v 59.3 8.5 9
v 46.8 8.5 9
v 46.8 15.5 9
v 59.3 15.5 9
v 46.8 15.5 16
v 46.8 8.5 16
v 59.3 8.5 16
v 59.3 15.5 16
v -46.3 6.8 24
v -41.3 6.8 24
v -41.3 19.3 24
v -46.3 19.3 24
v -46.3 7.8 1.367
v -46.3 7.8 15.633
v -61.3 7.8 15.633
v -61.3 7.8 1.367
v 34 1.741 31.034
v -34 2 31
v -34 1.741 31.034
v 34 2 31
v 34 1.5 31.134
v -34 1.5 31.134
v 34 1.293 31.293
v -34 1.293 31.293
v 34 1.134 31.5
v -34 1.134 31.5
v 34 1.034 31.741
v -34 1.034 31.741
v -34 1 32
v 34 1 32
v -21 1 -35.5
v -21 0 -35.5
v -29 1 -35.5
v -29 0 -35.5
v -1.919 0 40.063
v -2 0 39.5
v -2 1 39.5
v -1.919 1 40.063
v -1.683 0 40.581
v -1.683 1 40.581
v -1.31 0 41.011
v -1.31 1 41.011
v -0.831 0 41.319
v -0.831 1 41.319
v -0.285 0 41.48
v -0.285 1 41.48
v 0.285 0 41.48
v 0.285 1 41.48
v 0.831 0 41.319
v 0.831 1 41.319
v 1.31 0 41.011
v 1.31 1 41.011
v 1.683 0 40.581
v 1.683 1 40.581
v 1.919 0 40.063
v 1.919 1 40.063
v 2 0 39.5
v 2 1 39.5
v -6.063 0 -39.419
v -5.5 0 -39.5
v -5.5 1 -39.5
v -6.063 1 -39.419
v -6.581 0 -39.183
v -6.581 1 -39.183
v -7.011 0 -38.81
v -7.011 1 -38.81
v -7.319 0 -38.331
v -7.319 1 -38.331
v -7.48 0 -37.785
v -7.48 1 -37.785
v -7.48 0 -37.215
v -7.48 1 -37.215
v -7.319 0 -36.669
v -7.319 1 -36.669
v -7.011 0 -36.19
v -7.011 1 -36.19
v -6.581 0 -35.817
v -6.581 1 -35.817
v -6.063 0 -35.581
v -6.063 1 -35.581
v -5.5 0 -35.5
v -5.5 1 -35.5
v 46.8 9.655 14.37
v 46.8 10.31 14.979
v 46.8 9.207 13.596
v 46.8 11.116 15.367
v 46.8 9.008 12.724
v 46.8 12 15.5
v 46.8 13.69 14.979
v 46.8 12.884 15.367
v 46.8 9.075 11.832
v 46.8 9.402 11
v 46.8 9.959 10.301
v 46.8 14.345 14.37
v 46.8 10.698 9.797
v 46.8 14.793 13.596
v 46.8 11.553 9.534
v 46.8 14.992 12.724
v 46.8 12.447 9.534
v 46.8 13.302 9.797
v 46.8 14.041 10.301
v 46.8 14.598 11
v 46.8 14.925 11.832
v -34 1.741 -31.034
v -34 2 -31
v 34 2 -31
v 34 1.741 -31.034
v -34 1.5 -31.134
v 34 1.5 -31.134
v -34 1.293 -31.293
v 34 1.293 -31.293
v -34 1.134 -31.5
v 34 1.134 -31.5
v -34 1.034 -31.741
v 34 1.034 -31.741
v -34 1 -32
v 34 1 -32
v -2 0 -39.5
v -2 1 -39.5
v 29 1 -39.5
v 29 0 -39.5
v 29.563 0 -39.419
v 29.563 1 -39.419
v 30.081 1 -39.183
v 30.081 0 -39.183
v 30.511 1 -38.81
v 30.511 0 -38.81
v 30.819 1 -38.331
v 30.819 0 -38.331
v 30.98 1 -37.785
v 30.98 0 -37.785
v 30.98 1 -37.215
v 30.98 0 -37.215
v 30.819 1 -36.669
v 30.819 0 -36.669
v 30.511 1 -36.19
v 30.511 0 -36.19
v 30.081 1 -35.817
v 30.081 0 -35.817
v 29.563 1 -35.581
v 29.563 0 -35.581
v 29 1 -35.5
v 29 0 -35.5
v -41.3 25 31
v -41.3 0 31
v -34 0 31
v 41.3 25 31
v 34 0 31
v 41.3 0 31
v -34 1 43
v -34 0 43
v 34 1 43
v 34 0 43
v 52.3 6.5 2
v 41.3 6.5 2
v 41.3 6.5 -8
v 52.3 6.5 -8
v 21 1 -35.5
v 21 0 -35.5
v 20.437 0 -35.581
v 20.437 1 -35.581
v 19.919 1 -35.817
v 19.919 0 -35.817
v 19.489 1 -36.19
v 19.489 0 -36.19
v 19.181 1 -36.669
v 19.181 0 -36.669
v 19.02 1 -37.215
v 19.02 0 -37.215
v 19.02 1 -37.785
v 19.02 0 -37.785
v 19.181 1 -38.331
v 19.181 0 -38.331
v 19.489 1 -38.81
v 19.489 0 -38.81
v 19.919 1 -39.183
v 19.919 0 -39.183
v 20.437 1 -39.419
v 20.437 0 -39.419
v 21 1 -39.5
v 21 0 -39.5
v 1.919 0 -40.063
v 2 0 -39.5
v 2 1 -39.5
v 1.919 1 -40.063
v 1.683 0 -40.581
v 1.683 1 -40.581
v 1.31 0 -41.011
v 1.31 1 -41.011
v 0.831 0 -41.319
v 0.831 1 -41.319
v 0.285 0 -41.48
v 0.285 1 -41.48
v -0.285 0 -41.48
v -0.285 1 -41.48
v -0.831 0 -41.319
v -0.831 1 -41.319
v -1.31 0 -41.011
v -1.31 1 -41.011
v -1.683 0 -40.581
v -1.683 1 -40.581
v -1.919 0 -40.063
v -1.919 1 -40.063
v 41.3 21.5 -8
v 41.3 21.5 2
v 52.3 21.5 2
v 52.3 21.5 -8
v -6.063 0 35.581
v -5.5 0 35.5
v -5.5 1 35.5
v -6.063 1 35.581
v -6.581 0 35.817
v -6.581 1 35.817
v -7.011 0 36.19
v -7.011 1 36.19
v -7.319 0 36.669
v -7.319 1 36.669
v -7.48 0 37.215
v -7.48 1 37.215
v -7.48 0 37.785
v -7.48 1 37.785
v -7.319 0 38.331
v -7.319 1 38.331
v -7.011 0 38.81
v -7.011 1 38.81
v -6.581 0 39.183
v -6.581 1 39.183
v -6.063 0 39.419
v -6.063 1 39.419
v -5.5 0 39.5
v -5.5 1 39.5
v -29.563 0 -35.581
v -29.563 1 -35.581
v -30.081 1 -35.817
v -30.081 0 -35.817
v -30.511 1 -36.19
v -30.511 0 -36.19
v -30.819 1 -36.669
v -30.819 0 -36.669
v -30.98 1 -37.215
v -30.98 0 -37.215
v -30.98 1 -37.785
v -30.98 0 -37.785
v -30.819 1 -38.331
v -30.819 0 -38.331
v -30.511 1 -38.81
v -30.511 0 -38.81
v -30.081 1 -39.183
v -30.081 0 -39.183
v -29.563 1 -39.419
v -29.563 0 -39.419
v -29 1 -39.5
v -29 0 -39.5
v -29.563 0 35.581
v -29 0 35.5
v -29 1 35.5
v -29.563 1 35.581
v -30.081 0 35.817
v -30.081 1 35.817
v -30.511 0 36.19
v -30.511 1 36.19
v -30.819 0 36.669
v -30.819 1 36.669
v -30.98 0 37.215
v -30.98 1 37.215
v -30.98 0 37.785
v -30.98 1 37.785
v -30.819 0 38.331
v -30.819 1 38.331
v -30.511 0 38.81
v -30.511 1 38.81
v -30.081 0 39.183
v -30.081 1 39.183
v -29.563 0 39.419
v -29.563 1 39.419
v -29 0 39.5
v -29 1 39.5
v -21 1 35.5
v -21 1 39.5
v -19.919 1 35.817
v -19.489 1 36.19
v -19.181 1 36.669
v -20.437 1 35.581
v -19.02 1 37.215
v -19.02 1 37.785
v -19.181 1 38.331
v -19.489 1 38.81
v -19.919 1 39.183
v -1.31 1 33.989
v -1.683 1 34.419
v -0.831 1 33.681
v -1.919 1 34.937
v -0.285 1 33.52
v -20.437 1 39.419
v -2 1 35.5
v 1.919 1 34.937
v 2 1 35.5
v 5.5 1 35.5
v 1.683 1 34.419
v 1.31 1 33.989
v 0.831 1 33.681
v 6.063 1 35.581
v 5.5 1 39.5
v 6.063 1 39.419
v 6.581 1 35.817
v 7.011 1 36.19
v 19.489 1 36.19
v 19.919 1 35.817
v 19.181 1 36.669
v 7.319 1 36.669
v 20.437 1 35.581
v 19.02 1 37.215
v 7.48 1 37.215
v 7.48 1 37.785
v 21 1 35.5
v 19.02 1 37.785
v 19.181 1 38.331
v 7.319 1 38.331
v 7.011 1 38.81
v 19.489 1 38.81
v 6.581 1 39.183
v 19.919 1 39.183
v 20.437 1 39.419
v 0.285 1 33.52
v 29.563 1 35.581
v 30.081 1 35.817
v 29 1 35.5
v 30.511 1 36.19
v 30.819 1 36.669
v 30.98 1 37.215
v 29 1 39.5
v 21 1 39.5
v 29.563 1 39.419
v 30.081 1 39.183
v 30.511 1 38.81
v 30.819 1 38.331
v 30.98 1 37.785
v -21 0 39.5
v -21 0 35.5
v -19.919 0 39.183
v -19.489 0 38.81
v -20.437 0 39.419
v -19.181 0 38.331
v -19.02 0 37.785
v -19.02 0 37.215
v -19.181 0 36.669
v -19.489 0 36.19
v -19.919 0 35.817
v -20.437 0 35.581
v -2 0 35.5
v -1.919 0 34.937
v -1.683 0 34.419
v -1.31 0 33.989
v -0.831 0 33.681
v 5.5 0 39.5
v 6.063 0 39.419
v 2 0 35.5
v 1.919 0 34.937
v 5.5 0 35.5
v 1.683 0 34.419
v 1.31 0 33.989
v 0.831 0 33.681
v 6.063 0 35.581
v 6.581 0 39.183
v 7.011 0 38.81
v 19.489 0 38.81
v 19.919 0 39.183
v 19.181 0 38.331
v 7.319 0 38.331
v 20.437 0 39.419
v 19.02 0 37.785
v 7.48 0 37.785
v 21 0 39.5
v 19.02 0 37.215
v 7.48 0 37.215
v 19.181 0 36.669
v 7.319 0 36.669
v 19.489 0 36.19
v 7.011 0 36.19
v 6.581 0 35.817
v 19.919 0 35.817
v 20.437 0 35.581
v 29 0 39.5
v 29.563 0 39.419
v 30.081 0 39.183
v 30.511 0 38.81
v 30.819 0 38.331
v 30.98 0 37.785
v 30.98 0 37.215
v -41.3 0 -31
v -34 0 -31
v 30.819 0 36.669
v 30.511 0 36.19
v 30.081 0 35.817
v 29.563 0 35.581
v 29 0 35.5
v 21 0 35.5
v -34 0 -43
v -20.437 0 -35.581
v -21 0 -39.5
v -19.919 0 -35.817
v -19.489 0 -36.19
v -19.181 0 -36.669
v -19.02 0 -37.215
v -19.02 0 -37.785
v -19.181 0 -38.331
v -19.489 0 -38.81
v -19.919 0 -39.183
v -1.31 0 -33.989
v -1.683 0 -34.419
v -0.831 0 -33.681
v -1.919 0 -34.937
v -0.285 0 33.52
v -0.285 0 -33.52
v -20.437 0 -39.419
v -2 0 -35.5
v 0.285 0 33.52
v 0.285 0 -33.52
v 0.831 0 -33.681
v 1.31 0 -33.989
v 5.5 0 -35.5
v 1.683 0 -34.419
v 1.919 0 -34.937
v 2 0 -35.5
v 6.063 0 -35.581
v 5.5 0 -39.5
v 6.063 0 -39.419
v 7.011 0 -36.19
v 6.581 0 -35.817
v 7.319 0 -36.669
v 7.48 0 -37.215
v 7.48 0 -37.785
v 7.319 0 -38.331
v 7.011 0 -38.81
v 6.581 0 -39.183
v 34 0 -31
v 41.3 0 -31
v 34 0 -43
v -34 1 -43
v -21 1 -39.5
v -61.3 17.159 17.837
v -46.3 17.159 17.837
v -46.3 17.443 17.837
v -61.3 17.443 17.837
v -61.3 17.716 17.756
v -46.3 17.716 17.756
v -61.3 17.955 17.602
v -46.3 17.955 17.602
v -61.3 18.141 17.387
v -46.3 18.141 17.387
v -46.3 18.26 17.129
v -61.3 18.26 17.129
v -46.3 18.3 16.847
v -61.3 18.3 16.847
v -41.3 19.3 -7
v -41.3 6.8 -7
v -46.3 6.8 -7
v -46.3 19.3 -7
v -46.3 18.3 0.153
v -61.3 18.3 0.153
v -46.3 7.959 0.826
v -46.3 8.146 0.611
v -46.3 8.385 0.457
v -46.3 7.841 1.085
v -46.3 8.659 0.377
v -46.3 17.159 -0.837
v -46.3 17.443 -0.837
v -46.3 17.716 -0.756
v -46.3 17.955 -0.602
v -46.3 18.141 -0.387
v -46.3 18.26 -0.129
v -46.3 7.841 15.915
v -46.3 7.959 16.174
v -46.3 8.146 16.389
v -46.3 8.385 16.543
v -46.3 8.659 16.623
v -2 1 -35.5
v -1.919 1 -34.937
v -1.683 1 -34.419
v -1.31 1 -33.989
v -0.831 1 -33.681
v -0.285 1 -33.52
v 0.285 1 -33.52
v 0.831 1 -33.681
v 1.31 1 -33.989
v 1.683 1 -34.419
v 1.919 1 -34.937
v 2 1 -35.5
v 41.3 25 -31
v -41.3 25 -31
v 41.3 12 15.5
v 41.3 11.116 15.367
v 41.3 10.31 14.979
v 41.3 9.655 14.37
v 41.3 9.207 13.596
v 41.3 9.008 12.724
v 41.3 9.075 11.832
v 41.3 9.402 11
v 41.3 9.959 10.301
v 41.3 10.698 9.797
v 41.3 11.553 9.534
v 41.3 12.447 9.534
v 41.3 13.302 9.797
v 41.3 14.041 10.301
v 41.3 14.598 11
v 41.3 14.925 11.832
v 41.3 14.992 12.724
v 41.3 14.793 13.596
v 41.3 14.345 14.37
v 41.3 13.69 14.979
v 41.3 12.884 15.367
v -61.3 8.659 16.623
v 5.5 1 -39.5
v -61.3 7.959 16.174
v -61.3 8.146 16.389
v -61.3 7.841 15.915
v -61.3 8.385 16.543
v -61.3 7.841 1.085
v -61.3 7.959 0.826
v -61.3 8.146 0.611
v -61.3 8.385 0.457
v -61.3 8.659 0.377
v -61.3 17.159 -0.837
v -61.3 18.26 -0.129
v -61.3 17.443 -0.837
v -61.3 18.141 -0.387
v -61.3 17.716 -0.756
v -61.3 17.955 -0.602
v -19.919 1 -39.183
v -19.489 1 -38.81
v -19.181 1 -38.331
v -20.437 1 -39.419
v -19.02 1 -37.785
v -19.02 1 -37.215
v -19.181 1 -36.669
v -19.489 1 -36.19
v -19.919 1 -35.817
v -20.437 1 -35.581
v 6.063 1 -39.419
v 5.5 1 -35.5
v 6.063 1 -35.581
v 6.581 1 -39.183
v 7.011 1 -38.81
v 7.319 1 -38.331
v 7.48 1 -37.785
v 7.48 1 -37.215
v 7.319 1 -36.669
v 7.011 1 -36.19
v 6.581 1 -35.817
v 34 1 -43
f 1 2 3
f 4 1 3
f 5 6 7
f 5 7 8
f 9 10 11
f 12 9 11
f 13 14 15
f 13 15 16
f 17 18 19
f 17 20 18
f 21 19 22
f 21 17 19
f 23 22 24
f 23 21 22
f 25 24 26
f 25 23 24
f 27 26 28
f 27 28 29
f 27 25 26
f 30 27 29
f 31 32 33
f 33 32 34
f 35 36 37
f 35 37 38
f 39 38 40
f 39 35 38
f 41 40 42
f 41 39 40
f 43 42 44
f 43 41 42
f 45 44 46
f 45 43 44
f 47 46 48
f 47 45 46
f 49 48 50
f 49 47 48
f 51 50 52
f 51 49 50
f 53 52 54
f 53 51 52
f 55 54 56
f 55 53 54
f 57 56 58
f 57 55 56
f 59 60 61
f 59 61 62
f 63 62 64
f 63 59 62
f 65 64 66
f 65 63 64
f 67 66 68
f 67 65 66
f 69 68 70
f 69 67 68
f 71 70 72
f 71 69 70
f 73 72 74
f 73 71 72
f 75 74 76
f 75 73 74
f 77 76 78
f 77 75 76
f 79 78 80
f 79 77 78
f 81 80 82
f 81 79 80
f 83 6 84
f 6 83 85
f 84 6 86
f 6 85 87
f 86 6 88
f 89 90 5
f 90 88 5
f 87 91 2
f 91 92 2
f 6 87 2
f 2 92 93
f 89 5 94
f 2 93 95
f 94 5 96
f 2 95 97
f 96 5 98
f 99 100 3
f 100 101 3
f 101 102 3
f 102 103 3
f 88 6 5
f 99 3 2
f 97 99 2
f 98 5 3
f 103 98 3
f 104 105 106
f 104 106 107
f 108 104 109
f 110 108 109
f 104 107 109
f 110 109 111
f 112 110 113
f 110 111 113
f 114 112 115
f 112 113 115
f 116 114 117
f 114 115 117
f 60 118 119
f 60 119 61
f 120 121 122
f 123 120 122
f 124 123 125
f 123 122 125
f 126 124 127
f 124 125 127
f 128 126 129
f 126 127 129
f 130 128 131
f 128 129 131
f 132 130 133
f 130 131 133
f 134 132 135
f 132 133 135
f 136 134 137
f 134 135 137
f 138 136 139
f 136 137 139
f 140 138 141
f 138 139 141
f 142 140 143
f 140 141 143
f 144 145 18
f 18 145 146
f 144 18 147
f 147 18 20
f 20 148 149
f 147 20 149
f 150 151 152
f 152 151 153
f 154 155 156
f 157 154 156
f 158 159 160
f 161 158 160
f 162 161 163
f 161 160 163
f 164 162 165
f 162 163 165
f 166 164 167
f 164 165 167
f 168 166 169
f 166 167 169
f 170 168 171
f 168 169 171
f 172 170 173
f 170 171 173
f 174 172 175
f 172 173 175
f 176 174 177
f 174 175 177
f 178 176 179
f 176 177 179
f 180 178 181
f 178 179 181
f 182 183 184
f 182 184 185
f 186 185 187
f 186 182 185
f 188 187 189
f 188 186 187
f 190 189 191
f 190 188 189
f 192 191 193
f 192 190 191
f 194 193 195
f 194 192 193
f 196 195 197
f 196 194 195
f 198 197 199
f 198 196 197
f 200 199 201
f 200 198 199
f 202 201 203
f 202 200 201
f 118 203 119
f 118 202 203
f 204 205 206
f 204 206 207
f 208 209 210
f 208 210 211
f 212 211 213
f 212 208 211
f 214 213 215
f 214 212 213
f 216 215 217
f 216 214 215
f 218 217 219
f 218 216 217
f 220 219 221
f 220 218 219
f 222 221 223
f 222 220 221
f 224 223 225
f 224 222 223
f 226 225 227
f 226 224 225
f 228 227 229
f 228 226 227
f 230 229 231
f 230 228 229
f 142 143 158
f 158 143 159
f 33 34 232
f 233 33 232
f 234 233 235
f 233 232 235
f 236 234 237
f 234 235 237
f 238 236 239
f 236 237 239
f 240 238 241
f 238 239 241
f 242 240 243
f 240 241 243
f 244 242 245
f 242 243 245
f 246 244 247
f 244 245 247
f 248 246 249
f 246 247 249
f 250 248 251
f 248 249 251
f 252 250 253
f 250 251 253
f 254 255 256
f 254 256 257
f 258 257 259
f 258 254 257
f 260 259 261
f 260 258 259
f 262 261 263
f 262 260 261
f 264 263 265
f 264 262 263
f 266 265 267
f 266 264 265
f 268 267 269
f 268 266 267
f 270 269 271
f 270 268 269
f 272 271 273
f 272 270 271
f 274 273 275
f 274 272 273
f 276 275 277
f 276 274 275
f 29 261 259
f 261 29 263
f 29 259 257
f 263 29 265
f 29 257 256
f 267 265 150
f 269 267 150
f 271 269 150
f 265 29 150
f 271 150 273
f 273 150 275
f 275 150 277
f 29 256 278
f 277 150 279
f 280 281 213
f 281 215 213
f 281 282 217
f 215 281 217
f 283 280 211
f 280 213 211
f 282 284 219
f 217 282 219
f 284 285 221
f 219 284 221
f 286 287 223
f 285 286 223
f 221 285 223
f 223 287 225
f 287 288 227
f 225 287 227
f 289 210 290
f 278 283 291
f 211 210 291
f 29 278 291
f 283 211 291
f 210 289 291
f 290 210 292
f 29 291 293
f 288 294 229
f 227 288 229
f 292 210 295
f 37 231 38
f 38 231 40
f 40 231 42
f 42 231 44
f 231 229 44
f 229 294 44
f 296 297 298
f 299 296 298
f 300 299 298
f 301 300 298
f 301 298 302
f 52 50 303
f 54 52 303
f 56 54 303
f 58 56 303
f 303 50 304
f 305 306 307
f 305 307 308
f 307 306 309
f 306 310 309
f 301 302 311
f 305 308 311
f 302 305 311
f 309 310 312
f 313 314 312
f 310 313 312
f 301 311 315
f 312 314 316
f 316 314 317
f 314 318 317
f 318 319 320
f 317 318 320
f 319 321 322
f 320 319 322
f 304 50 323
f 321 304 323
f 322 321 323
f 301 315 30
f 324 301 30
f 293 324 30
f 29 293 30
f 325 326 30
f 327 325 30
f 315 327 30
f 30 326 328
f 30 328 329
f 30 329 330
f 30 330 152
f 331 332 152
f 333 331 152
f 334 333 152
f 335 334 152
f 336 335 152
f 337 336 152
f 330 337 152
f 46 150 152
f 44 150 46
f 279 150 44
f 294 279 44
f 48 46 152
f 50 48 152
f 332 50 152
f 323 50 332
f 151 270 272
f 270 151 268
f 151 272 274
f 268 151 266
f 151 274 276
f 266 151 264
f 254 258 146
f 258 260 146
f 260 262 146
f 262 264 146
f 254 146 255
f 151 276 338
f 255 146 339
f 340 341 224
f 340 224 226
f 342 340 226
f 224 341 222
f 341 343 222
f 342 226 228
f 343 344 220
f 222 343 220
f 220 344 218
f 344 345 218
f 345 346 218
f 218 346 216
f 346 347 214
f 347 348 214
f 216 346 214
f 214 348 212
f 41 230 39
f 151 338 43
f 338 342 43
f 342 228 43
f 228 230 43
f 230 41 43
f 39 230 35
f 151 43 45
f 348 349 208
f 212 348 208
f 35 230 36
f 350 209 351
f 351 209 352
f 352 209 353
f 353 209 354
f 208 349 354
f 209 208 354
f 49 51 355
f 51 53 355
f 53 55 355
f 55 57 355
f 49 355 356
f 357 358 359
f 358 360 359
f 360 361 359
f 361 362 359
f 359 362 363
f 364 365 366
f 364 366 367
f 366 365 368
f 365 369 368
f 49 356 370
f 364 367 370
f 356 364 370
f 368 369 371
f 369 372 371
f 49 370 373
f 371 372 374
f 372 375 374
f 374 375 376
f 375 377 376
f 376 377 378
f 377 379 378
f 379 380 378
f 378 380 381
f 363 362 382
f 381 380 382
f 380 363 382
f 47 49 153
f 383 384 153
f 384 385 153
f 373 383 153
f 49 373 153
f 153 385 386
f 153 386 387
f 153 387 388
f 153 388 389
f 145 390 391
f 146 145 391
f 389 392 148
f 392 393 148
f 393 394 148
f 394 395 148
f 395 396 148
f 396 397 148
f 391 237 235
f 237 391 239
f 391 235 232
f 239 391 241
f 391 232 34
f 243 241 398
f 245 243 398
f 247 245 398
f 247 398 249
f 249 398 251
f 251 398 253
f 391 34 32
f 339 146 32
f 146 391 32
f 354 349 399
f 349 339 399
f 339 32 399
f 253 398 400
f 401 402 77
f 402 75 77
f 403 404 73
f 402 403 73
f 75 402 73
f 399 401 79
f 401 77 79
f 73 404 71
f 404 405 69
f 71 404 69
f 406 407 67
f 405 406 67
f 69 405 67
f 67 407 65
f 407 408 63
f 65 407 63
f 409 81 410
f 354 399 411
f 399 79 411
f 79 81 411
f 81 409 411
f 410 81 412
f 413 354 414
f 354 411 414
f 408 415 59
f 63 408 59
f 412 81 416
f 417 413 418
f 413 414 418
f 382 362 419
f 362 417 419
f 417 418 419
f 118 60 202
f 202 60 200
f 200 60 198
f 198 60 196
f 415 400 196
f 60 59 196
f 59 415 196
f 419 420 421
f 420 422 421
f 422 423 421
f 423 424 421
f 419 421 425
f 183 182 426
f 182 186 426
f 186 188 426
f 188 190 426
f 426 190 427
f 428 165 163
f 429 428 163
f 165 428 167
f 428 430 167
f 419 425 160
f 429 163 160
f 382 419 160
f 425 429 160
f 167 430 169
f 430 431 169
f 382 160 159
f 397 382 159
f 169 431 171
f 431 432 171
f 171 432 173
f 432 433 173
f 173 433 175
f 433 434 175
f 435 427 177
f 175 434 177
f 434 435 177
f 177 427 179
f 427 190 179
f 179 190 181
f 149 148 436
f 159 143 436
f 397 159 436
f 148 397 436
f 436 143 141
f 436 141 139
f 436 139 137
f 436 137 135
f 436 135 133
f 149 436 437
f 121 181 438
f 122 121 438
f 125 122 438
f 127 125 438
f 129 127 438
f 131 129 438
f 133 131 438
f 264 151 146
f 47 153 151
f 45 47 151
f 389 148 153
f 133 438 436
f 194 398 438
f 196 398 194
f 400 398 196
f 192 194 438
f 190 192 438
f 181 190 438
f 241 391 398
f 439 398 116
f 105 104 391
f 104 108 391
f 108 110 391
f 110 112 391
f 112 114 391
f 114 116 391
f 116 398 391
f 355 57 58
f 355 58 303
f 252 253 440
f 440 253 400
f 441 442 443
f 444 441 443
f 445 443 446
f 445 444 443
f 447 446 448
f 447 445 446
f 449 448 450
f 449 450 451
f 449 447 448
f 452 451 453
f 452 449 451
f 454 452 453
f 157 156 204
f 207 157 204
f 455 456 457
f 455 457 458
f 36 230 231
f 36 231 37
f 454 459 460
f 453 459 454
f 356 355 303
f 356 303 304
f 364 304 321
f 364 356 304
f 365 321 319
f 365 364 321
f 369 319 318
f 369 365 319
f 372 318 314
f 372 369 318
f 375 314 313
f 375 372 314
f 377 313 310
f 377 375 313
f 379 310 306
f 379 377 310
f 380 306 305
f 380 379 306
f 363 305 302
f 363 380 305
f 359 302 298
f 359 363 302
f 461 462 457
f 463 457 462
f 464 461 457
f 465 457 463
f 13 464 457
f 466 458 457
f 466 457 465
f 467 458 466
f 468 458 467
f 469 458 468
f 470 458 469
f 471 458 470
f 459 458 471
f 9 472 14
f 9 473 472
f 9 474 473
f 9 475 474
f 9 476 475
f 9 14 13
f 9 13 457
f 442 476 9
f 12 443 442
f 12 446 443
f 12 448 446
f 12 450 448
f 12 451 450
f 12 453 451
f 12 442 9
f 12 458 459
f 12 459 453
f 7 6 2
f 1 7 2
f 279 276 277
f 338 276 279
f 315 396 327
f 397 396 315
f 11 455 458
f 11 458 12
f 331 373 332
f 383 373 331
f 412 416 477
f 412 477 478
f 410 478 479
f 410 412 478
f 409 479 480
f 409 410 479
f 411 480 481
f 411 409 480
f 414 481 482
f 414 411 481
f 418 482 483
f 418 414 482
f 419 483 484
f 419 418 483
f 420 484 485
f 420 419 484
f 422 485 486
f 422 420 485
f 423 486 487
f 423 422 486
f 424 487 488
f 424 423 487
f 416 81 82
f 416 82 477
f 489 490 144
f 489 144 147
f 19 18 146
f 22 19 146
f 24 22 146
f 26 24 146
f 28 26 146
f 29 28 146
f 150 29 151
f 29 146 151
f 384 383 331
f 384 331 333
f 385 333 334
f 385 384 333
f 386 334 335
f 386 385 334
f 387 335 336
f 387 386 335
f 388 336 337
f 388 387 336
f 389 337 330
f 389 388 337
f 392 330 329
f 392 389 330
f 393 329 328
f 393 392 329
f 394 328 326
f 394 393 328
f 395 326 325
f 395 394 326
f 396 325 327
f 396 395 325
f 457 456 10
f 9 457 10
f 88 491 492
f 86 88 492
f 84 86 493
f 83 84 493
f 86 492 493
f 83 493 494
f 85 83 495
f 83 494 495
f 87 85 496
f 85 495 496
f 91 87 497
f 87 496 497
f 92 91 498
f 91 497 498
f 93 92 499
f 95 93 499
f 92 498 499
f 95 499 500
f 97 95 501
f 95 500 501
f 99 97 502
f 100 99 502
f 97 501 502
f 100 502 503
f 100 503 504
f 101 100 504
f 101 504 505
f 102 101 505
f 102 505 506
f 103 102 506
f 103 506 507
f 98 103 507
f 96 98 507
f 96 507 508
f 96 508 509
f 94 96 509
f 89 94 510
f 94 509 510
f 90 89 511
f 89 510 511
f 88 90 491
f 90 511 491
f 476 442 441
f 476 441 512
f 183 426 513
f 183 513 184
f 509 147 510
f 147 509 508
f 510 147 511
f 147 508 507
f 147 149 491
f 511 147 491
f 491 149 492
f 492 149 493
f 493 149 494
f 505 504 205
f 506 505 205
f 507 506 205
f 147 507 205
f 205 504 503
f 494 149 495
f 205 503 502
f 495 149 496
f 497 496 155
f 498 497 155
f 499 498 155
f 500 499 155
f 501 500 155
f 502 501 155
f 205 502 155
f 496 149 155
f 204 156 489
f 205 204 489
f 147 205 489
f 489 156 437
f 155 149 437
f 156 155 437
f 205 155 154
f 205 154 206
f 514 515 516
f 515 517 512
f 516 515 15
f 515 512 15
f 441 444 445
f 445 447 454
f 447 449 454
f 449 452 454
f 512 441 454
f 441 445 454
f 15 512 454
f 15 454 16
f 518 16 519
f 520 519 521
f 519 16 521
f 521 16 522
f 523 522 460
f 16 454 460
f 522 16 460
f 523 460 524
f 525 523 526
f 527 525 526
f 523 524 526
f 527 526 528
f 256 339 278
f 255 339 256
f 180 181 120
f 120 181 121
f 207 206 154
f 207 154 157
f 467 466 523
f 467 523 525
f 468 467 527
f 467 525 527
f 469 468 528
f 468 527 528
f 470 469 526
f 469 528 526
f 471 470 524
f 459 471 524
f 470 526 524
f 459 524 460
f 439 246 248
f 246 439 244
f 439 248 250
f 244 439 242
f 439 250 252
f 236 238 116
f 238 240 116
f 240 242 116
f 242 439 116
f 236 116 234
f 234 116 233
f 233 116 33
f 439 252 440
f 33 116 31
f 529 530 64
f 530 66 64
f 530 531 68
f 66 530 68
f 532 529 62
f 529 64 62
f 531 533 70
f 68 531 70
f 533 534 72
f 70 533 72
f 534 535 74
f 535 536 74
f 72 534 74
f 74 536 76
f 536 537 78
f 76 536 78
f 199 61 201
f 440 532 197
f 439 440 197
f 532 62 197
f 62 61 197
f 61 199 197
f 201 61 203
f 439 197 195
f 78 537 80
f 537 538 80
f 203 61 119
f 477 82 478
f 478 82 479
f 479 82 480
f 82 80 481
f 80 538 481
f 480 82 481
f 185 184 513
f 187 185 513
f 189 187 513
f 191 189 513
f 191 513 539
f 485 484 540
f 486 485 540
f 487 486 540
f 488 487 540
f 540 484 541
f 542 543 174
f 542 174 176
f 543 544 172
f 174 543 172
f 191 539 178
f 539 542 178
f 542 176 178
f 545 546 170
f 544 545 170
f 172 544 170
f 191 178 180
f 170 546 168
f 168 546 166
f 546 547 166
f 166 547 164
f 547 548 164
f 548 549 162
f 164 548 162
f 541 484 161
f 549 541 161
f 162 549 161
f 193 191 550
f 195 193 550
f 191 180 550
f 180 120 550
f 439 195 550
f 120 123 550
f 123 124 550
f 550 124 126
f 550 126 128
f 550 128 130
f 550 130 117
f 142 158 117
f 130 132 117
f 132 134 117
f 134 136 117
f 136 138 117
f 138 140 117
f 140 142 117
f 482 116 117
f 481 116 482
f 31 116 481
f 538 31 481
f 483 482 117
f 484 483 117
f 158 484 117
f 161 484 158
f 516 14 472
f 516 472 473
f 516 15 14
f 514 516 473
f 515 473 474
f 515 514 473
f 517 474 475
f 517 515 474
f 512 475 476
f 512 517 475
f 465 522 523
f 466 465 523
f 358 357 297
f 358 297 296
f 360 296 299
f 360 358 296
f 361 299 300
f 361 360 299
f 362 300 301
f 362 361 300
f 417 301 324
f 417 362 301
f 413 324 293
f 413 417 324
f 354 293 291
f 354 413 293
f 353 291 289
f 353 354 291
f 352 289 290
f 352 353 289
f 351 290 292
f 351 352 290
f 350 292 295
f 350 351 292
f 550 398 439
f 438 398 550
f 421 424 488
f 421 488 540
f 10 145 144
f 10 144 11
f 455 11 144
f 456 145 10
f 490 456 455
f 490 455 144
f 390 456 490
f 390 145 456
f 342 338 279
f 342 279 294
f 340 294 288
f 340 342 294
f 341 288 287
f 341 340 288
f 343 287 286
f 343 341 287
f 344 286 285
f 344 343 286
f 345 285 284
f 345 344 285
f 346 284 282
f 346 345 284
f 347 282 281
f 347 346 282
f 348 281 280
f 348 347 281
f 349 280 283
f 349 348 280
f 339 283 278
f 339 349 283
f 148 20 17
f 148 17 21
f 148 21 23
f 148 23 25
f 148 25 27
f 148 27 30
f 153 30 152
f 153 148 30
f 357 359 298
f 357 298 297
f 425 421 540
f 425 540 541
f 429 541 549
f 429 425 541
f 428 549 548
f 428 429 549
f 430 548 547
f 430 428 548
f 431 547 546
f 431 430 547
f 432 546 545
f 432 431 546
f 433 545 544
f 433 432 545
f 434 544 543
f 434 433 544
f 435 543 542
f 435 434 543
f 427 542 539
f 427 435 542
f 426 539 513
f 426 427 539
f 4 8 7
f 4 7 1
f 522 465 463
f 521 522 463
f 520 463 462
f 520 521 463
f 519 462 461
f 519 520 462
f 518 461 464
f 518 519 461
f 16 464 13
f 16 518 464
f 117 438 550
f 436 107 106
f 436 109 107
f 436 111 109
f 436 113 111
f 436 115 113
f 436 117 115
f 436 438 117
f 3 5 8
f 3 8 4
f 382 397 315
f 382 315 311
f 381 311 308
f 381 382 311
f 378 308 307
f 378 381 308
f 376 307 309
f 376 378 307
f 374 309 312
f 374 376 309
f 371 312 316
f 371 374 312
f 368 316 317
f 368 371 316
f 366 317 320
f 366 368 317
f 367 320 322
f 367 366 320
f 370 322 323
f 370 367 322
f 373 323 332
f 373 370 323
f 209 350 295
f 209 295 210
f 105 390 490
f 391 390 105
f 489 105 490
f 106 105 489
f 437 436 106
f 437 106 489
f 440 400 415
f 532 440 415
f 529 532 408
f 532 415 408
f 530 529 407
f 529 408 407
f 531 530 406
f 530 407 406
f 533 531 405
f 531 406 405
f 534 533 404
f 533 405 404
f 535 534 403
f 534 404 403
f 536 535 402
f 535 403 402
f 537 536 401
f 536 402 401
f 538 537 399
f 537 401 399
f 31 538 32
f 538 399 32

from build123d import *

# Parameters (mm, degrees)
SKETCH_1_W      = 82.6
SKETCH_1_H      = 62
EXTRUDE_1_DEPTH = 25
SKETCH_2_W      = 68
SKETCH_2_H      = 12
EXTRUDE_2_DEPTH = 1
FILLET_1_R      = 1
SKETCH_3_R      = 3
EXTRUDE_3_DEPTH = 5.5
SKETCH_4_W      = 10
SKETCH_4_H      = 15
EXTRUDE_4_DEPTH = 11
SKETCH_5_W      = 31
SKETCH_5_H      = 12.5
EXTRUDE_5_DEPTH = 5
EXTRUDE_6_DEPTH = 15
FILLET_2_R      = 1
SKETCH_7_W      = 7
SKETCH_7_H      = 7
EXTRUDE_7_DEPTH = 12.5


with BuildPart() as part:
    # 草图1 → 凸台-拉伸1 (new body)
    with BuildSketch(Plane(origin=(0, 0, 0), x_dir=(1, 0, 0), z_dir=(0, 1, 0))):
        Rectangle(SKETCH_1_W, SKETCH_1_H)
    extrude(amount=EXTRUDE_1_DEPTH)

    # 草图2 → 凸台-拉伸2 (add)
    # profile 1 of 2: a face of its own
    with BuildSketch(Plane.XZ):
        with Locations((0, 37)):
            Rectangle(SKETCH_2_W, SKETCH_2_H)
        with BuildLine():
            Line((-29, 39.5), (-21, 39.5))
            ThreePointArc((-21, 39.5), (-19, 37.5), (-21, 35.5))
            Line((-21, 35.5), (-29, 35.5))
            ThreePointArc((-29, 35.5), (-31, 37.5), (-29, 39.5))
        make_face(mode=Mode.SUBTRACT)
        with BuildLine():
            Line((21, 39.5), (29, 39.5))
            ThreePointArc((29, 39.5), (31, 37.5), (29, 35.5))
            Line((29, 35.5), (21, 35.5))
            ThreePointArc((21, 35.5), (19, 37.5), (21, 39.5))
        make_face(mode=Mode.SUBTRACT)
        with BuildLine():
            Line((-5.5, 39.5), (-2, 39.5))
            ThreePointArc((-2, 39.5), (0, 41.5), (2, 39.5))
            Line((2, 39.5), (5.5, 39.5))
            ThreePointArc((5.5, 39.5), (7.5, 37.5), (5.5, 35.5))
            Line((5.5, 35.5), (2, 35.5))
            ThreePointArc((2, 35.5), (0, 33.5), (-2, 35.5))
            Line((-2, 35.5), (-5.5, 35.5))
            ThreePointArc((-5.5, 35.5), (-7.5, 37.5), (-5.5, 39.5))
        make_face(mode=Mode.SUBTRACT)
    # profile 2 of 2: a face of its own
    with BuildSketch(Plane.XZ):
        with Locations((0, -37)):
            Rectangle(SKETCH_2_W, SKETCH_2_H)
        with BuildLine():
            Line((2, -35.5), (5.5, -35.5))
            ThreePointArc((5.5, -35.5), (7.5, -37.5), (5.5, -39.5))
            Line((5.5, -39.5), (2, -39.5))
            ThreePointArc((2, -39.5), (0, -41.5), (-2, -39.5))
            Line((-2, -39.5), (-5.5, -39.5))
            ThreePointArc((-5.5, -39.5), (-7.5, -37.5), (-5.5, -35.5))
            Line((-5.5, -35.5), (-2, -35.5))
            ThreePointArc((-2, -35.5), (0, -33.5), (2, -35.5))
        make_face(mode=Mode.SUBTRACT)
        with BuildLine():
            Line((21, -39.5), (29, -39.5))
            ThreePointArc((29, -39.5), (31, -37.5), (29, -35.5))
            Line((29, -35.5), (21, -35.5))
            ThreePointArc((21, -35.5), (19, -37.5), (21, -39.5))
        make_face(mode=Mode.SUBTRACT)
        with BuildLine():
            Line((-29, -39.5), (-21, -39.5))
            ThreePointArc((-21, -39.5), (-19, -37.5), (-21, -35.5))
            Line((-21, -35.5), (-29, -35.5))
            ThreePointArc((-29, -35.5), (-31, -37.5), (-29, -39.5))
        make_face(mode=Mode.SUBTRACT)
    extrude(amount=-EXTRUDE_2_DEPTH)

    # 圆角1
    fillet_1_edges = [part.edges().sort_by_distance(p)[0] for p in [
        (0, 1, 31),
        (0, 1, -31),
    ]]
    fillet(fillet_1_edges, radius=FILLET_1_R)

    # 草图3 → 凸台-拉伸3 (add)
    with BuildSketch(Plane(origin=(41.3, 0, 0), x_dir=(0, 0, -1), z_dir=(1, 0, 0))):
        with Locations(Location((-12.5, 12, 0), (0, 0, 180))):
            Circle(SKETCH_3_R)
    extrude(amount=EXTRUDE_3_DEPTH)

    # 草图4 → 凸台-拉伸4 (add)
    with BuildSketch(Plane(origin=(41.3, 0, 0), x_dir=(0, 0, -1), z_dir=(1, 0, 0))):
        with Locations((3, 14)):
            Rectangle(SKETCH_4_W, SKETCH_4_H)
    extrude(amount=EXTRUDE_4_DEPTH)

    # 草图5 → 凸台-拉伸5 (add)
    with BuildSketch(Plane.ZY.offset(41.3)):
        with Locations((8.5, 13.05)):
            Rectangle(SKETCH_5_W, SKETCH_5_H)
    extrude(amount=EXTRUDE_5_DEPTH)

    # 草图6 → 凸台-拉伸6 (add)
    with BuildSketch(Plane.ZY.offset(46.3)):
        Polygon((-1, 18.3), (18, 18.3), (16.5, 7.8), (0.5, 7.8), align=None)
    extrude(amount=EXTRUDE_6_DEPTH)

    # 圆角2
    fillet_2_edges = [part.edges().sort_by_distance(p)[0] for p in [
        (-53.8, 18.3, -1),
        (-53.8, 7.8, 0.5),
        (-53.8, 7.8, 16.5),
        (-53.8, 18.3, 18),
    ]]
    fillet(fillet_2_edges, radius=FILLET_2_R)

    # 草图7 → 凸台-拉伸7 (add)
    with BuildSketch(Plane(origin=(46.8, 0, 0), x_dir=(0, 0, -1), z_dir=(1, 0, 0))):
        with Locations((-12.5, 12)):
            Rectangle(SKETCH_7_W, SKETCH_7_H)
    extrude(amount=EXTRUDE_7_DEPTH)


solid = part.part
